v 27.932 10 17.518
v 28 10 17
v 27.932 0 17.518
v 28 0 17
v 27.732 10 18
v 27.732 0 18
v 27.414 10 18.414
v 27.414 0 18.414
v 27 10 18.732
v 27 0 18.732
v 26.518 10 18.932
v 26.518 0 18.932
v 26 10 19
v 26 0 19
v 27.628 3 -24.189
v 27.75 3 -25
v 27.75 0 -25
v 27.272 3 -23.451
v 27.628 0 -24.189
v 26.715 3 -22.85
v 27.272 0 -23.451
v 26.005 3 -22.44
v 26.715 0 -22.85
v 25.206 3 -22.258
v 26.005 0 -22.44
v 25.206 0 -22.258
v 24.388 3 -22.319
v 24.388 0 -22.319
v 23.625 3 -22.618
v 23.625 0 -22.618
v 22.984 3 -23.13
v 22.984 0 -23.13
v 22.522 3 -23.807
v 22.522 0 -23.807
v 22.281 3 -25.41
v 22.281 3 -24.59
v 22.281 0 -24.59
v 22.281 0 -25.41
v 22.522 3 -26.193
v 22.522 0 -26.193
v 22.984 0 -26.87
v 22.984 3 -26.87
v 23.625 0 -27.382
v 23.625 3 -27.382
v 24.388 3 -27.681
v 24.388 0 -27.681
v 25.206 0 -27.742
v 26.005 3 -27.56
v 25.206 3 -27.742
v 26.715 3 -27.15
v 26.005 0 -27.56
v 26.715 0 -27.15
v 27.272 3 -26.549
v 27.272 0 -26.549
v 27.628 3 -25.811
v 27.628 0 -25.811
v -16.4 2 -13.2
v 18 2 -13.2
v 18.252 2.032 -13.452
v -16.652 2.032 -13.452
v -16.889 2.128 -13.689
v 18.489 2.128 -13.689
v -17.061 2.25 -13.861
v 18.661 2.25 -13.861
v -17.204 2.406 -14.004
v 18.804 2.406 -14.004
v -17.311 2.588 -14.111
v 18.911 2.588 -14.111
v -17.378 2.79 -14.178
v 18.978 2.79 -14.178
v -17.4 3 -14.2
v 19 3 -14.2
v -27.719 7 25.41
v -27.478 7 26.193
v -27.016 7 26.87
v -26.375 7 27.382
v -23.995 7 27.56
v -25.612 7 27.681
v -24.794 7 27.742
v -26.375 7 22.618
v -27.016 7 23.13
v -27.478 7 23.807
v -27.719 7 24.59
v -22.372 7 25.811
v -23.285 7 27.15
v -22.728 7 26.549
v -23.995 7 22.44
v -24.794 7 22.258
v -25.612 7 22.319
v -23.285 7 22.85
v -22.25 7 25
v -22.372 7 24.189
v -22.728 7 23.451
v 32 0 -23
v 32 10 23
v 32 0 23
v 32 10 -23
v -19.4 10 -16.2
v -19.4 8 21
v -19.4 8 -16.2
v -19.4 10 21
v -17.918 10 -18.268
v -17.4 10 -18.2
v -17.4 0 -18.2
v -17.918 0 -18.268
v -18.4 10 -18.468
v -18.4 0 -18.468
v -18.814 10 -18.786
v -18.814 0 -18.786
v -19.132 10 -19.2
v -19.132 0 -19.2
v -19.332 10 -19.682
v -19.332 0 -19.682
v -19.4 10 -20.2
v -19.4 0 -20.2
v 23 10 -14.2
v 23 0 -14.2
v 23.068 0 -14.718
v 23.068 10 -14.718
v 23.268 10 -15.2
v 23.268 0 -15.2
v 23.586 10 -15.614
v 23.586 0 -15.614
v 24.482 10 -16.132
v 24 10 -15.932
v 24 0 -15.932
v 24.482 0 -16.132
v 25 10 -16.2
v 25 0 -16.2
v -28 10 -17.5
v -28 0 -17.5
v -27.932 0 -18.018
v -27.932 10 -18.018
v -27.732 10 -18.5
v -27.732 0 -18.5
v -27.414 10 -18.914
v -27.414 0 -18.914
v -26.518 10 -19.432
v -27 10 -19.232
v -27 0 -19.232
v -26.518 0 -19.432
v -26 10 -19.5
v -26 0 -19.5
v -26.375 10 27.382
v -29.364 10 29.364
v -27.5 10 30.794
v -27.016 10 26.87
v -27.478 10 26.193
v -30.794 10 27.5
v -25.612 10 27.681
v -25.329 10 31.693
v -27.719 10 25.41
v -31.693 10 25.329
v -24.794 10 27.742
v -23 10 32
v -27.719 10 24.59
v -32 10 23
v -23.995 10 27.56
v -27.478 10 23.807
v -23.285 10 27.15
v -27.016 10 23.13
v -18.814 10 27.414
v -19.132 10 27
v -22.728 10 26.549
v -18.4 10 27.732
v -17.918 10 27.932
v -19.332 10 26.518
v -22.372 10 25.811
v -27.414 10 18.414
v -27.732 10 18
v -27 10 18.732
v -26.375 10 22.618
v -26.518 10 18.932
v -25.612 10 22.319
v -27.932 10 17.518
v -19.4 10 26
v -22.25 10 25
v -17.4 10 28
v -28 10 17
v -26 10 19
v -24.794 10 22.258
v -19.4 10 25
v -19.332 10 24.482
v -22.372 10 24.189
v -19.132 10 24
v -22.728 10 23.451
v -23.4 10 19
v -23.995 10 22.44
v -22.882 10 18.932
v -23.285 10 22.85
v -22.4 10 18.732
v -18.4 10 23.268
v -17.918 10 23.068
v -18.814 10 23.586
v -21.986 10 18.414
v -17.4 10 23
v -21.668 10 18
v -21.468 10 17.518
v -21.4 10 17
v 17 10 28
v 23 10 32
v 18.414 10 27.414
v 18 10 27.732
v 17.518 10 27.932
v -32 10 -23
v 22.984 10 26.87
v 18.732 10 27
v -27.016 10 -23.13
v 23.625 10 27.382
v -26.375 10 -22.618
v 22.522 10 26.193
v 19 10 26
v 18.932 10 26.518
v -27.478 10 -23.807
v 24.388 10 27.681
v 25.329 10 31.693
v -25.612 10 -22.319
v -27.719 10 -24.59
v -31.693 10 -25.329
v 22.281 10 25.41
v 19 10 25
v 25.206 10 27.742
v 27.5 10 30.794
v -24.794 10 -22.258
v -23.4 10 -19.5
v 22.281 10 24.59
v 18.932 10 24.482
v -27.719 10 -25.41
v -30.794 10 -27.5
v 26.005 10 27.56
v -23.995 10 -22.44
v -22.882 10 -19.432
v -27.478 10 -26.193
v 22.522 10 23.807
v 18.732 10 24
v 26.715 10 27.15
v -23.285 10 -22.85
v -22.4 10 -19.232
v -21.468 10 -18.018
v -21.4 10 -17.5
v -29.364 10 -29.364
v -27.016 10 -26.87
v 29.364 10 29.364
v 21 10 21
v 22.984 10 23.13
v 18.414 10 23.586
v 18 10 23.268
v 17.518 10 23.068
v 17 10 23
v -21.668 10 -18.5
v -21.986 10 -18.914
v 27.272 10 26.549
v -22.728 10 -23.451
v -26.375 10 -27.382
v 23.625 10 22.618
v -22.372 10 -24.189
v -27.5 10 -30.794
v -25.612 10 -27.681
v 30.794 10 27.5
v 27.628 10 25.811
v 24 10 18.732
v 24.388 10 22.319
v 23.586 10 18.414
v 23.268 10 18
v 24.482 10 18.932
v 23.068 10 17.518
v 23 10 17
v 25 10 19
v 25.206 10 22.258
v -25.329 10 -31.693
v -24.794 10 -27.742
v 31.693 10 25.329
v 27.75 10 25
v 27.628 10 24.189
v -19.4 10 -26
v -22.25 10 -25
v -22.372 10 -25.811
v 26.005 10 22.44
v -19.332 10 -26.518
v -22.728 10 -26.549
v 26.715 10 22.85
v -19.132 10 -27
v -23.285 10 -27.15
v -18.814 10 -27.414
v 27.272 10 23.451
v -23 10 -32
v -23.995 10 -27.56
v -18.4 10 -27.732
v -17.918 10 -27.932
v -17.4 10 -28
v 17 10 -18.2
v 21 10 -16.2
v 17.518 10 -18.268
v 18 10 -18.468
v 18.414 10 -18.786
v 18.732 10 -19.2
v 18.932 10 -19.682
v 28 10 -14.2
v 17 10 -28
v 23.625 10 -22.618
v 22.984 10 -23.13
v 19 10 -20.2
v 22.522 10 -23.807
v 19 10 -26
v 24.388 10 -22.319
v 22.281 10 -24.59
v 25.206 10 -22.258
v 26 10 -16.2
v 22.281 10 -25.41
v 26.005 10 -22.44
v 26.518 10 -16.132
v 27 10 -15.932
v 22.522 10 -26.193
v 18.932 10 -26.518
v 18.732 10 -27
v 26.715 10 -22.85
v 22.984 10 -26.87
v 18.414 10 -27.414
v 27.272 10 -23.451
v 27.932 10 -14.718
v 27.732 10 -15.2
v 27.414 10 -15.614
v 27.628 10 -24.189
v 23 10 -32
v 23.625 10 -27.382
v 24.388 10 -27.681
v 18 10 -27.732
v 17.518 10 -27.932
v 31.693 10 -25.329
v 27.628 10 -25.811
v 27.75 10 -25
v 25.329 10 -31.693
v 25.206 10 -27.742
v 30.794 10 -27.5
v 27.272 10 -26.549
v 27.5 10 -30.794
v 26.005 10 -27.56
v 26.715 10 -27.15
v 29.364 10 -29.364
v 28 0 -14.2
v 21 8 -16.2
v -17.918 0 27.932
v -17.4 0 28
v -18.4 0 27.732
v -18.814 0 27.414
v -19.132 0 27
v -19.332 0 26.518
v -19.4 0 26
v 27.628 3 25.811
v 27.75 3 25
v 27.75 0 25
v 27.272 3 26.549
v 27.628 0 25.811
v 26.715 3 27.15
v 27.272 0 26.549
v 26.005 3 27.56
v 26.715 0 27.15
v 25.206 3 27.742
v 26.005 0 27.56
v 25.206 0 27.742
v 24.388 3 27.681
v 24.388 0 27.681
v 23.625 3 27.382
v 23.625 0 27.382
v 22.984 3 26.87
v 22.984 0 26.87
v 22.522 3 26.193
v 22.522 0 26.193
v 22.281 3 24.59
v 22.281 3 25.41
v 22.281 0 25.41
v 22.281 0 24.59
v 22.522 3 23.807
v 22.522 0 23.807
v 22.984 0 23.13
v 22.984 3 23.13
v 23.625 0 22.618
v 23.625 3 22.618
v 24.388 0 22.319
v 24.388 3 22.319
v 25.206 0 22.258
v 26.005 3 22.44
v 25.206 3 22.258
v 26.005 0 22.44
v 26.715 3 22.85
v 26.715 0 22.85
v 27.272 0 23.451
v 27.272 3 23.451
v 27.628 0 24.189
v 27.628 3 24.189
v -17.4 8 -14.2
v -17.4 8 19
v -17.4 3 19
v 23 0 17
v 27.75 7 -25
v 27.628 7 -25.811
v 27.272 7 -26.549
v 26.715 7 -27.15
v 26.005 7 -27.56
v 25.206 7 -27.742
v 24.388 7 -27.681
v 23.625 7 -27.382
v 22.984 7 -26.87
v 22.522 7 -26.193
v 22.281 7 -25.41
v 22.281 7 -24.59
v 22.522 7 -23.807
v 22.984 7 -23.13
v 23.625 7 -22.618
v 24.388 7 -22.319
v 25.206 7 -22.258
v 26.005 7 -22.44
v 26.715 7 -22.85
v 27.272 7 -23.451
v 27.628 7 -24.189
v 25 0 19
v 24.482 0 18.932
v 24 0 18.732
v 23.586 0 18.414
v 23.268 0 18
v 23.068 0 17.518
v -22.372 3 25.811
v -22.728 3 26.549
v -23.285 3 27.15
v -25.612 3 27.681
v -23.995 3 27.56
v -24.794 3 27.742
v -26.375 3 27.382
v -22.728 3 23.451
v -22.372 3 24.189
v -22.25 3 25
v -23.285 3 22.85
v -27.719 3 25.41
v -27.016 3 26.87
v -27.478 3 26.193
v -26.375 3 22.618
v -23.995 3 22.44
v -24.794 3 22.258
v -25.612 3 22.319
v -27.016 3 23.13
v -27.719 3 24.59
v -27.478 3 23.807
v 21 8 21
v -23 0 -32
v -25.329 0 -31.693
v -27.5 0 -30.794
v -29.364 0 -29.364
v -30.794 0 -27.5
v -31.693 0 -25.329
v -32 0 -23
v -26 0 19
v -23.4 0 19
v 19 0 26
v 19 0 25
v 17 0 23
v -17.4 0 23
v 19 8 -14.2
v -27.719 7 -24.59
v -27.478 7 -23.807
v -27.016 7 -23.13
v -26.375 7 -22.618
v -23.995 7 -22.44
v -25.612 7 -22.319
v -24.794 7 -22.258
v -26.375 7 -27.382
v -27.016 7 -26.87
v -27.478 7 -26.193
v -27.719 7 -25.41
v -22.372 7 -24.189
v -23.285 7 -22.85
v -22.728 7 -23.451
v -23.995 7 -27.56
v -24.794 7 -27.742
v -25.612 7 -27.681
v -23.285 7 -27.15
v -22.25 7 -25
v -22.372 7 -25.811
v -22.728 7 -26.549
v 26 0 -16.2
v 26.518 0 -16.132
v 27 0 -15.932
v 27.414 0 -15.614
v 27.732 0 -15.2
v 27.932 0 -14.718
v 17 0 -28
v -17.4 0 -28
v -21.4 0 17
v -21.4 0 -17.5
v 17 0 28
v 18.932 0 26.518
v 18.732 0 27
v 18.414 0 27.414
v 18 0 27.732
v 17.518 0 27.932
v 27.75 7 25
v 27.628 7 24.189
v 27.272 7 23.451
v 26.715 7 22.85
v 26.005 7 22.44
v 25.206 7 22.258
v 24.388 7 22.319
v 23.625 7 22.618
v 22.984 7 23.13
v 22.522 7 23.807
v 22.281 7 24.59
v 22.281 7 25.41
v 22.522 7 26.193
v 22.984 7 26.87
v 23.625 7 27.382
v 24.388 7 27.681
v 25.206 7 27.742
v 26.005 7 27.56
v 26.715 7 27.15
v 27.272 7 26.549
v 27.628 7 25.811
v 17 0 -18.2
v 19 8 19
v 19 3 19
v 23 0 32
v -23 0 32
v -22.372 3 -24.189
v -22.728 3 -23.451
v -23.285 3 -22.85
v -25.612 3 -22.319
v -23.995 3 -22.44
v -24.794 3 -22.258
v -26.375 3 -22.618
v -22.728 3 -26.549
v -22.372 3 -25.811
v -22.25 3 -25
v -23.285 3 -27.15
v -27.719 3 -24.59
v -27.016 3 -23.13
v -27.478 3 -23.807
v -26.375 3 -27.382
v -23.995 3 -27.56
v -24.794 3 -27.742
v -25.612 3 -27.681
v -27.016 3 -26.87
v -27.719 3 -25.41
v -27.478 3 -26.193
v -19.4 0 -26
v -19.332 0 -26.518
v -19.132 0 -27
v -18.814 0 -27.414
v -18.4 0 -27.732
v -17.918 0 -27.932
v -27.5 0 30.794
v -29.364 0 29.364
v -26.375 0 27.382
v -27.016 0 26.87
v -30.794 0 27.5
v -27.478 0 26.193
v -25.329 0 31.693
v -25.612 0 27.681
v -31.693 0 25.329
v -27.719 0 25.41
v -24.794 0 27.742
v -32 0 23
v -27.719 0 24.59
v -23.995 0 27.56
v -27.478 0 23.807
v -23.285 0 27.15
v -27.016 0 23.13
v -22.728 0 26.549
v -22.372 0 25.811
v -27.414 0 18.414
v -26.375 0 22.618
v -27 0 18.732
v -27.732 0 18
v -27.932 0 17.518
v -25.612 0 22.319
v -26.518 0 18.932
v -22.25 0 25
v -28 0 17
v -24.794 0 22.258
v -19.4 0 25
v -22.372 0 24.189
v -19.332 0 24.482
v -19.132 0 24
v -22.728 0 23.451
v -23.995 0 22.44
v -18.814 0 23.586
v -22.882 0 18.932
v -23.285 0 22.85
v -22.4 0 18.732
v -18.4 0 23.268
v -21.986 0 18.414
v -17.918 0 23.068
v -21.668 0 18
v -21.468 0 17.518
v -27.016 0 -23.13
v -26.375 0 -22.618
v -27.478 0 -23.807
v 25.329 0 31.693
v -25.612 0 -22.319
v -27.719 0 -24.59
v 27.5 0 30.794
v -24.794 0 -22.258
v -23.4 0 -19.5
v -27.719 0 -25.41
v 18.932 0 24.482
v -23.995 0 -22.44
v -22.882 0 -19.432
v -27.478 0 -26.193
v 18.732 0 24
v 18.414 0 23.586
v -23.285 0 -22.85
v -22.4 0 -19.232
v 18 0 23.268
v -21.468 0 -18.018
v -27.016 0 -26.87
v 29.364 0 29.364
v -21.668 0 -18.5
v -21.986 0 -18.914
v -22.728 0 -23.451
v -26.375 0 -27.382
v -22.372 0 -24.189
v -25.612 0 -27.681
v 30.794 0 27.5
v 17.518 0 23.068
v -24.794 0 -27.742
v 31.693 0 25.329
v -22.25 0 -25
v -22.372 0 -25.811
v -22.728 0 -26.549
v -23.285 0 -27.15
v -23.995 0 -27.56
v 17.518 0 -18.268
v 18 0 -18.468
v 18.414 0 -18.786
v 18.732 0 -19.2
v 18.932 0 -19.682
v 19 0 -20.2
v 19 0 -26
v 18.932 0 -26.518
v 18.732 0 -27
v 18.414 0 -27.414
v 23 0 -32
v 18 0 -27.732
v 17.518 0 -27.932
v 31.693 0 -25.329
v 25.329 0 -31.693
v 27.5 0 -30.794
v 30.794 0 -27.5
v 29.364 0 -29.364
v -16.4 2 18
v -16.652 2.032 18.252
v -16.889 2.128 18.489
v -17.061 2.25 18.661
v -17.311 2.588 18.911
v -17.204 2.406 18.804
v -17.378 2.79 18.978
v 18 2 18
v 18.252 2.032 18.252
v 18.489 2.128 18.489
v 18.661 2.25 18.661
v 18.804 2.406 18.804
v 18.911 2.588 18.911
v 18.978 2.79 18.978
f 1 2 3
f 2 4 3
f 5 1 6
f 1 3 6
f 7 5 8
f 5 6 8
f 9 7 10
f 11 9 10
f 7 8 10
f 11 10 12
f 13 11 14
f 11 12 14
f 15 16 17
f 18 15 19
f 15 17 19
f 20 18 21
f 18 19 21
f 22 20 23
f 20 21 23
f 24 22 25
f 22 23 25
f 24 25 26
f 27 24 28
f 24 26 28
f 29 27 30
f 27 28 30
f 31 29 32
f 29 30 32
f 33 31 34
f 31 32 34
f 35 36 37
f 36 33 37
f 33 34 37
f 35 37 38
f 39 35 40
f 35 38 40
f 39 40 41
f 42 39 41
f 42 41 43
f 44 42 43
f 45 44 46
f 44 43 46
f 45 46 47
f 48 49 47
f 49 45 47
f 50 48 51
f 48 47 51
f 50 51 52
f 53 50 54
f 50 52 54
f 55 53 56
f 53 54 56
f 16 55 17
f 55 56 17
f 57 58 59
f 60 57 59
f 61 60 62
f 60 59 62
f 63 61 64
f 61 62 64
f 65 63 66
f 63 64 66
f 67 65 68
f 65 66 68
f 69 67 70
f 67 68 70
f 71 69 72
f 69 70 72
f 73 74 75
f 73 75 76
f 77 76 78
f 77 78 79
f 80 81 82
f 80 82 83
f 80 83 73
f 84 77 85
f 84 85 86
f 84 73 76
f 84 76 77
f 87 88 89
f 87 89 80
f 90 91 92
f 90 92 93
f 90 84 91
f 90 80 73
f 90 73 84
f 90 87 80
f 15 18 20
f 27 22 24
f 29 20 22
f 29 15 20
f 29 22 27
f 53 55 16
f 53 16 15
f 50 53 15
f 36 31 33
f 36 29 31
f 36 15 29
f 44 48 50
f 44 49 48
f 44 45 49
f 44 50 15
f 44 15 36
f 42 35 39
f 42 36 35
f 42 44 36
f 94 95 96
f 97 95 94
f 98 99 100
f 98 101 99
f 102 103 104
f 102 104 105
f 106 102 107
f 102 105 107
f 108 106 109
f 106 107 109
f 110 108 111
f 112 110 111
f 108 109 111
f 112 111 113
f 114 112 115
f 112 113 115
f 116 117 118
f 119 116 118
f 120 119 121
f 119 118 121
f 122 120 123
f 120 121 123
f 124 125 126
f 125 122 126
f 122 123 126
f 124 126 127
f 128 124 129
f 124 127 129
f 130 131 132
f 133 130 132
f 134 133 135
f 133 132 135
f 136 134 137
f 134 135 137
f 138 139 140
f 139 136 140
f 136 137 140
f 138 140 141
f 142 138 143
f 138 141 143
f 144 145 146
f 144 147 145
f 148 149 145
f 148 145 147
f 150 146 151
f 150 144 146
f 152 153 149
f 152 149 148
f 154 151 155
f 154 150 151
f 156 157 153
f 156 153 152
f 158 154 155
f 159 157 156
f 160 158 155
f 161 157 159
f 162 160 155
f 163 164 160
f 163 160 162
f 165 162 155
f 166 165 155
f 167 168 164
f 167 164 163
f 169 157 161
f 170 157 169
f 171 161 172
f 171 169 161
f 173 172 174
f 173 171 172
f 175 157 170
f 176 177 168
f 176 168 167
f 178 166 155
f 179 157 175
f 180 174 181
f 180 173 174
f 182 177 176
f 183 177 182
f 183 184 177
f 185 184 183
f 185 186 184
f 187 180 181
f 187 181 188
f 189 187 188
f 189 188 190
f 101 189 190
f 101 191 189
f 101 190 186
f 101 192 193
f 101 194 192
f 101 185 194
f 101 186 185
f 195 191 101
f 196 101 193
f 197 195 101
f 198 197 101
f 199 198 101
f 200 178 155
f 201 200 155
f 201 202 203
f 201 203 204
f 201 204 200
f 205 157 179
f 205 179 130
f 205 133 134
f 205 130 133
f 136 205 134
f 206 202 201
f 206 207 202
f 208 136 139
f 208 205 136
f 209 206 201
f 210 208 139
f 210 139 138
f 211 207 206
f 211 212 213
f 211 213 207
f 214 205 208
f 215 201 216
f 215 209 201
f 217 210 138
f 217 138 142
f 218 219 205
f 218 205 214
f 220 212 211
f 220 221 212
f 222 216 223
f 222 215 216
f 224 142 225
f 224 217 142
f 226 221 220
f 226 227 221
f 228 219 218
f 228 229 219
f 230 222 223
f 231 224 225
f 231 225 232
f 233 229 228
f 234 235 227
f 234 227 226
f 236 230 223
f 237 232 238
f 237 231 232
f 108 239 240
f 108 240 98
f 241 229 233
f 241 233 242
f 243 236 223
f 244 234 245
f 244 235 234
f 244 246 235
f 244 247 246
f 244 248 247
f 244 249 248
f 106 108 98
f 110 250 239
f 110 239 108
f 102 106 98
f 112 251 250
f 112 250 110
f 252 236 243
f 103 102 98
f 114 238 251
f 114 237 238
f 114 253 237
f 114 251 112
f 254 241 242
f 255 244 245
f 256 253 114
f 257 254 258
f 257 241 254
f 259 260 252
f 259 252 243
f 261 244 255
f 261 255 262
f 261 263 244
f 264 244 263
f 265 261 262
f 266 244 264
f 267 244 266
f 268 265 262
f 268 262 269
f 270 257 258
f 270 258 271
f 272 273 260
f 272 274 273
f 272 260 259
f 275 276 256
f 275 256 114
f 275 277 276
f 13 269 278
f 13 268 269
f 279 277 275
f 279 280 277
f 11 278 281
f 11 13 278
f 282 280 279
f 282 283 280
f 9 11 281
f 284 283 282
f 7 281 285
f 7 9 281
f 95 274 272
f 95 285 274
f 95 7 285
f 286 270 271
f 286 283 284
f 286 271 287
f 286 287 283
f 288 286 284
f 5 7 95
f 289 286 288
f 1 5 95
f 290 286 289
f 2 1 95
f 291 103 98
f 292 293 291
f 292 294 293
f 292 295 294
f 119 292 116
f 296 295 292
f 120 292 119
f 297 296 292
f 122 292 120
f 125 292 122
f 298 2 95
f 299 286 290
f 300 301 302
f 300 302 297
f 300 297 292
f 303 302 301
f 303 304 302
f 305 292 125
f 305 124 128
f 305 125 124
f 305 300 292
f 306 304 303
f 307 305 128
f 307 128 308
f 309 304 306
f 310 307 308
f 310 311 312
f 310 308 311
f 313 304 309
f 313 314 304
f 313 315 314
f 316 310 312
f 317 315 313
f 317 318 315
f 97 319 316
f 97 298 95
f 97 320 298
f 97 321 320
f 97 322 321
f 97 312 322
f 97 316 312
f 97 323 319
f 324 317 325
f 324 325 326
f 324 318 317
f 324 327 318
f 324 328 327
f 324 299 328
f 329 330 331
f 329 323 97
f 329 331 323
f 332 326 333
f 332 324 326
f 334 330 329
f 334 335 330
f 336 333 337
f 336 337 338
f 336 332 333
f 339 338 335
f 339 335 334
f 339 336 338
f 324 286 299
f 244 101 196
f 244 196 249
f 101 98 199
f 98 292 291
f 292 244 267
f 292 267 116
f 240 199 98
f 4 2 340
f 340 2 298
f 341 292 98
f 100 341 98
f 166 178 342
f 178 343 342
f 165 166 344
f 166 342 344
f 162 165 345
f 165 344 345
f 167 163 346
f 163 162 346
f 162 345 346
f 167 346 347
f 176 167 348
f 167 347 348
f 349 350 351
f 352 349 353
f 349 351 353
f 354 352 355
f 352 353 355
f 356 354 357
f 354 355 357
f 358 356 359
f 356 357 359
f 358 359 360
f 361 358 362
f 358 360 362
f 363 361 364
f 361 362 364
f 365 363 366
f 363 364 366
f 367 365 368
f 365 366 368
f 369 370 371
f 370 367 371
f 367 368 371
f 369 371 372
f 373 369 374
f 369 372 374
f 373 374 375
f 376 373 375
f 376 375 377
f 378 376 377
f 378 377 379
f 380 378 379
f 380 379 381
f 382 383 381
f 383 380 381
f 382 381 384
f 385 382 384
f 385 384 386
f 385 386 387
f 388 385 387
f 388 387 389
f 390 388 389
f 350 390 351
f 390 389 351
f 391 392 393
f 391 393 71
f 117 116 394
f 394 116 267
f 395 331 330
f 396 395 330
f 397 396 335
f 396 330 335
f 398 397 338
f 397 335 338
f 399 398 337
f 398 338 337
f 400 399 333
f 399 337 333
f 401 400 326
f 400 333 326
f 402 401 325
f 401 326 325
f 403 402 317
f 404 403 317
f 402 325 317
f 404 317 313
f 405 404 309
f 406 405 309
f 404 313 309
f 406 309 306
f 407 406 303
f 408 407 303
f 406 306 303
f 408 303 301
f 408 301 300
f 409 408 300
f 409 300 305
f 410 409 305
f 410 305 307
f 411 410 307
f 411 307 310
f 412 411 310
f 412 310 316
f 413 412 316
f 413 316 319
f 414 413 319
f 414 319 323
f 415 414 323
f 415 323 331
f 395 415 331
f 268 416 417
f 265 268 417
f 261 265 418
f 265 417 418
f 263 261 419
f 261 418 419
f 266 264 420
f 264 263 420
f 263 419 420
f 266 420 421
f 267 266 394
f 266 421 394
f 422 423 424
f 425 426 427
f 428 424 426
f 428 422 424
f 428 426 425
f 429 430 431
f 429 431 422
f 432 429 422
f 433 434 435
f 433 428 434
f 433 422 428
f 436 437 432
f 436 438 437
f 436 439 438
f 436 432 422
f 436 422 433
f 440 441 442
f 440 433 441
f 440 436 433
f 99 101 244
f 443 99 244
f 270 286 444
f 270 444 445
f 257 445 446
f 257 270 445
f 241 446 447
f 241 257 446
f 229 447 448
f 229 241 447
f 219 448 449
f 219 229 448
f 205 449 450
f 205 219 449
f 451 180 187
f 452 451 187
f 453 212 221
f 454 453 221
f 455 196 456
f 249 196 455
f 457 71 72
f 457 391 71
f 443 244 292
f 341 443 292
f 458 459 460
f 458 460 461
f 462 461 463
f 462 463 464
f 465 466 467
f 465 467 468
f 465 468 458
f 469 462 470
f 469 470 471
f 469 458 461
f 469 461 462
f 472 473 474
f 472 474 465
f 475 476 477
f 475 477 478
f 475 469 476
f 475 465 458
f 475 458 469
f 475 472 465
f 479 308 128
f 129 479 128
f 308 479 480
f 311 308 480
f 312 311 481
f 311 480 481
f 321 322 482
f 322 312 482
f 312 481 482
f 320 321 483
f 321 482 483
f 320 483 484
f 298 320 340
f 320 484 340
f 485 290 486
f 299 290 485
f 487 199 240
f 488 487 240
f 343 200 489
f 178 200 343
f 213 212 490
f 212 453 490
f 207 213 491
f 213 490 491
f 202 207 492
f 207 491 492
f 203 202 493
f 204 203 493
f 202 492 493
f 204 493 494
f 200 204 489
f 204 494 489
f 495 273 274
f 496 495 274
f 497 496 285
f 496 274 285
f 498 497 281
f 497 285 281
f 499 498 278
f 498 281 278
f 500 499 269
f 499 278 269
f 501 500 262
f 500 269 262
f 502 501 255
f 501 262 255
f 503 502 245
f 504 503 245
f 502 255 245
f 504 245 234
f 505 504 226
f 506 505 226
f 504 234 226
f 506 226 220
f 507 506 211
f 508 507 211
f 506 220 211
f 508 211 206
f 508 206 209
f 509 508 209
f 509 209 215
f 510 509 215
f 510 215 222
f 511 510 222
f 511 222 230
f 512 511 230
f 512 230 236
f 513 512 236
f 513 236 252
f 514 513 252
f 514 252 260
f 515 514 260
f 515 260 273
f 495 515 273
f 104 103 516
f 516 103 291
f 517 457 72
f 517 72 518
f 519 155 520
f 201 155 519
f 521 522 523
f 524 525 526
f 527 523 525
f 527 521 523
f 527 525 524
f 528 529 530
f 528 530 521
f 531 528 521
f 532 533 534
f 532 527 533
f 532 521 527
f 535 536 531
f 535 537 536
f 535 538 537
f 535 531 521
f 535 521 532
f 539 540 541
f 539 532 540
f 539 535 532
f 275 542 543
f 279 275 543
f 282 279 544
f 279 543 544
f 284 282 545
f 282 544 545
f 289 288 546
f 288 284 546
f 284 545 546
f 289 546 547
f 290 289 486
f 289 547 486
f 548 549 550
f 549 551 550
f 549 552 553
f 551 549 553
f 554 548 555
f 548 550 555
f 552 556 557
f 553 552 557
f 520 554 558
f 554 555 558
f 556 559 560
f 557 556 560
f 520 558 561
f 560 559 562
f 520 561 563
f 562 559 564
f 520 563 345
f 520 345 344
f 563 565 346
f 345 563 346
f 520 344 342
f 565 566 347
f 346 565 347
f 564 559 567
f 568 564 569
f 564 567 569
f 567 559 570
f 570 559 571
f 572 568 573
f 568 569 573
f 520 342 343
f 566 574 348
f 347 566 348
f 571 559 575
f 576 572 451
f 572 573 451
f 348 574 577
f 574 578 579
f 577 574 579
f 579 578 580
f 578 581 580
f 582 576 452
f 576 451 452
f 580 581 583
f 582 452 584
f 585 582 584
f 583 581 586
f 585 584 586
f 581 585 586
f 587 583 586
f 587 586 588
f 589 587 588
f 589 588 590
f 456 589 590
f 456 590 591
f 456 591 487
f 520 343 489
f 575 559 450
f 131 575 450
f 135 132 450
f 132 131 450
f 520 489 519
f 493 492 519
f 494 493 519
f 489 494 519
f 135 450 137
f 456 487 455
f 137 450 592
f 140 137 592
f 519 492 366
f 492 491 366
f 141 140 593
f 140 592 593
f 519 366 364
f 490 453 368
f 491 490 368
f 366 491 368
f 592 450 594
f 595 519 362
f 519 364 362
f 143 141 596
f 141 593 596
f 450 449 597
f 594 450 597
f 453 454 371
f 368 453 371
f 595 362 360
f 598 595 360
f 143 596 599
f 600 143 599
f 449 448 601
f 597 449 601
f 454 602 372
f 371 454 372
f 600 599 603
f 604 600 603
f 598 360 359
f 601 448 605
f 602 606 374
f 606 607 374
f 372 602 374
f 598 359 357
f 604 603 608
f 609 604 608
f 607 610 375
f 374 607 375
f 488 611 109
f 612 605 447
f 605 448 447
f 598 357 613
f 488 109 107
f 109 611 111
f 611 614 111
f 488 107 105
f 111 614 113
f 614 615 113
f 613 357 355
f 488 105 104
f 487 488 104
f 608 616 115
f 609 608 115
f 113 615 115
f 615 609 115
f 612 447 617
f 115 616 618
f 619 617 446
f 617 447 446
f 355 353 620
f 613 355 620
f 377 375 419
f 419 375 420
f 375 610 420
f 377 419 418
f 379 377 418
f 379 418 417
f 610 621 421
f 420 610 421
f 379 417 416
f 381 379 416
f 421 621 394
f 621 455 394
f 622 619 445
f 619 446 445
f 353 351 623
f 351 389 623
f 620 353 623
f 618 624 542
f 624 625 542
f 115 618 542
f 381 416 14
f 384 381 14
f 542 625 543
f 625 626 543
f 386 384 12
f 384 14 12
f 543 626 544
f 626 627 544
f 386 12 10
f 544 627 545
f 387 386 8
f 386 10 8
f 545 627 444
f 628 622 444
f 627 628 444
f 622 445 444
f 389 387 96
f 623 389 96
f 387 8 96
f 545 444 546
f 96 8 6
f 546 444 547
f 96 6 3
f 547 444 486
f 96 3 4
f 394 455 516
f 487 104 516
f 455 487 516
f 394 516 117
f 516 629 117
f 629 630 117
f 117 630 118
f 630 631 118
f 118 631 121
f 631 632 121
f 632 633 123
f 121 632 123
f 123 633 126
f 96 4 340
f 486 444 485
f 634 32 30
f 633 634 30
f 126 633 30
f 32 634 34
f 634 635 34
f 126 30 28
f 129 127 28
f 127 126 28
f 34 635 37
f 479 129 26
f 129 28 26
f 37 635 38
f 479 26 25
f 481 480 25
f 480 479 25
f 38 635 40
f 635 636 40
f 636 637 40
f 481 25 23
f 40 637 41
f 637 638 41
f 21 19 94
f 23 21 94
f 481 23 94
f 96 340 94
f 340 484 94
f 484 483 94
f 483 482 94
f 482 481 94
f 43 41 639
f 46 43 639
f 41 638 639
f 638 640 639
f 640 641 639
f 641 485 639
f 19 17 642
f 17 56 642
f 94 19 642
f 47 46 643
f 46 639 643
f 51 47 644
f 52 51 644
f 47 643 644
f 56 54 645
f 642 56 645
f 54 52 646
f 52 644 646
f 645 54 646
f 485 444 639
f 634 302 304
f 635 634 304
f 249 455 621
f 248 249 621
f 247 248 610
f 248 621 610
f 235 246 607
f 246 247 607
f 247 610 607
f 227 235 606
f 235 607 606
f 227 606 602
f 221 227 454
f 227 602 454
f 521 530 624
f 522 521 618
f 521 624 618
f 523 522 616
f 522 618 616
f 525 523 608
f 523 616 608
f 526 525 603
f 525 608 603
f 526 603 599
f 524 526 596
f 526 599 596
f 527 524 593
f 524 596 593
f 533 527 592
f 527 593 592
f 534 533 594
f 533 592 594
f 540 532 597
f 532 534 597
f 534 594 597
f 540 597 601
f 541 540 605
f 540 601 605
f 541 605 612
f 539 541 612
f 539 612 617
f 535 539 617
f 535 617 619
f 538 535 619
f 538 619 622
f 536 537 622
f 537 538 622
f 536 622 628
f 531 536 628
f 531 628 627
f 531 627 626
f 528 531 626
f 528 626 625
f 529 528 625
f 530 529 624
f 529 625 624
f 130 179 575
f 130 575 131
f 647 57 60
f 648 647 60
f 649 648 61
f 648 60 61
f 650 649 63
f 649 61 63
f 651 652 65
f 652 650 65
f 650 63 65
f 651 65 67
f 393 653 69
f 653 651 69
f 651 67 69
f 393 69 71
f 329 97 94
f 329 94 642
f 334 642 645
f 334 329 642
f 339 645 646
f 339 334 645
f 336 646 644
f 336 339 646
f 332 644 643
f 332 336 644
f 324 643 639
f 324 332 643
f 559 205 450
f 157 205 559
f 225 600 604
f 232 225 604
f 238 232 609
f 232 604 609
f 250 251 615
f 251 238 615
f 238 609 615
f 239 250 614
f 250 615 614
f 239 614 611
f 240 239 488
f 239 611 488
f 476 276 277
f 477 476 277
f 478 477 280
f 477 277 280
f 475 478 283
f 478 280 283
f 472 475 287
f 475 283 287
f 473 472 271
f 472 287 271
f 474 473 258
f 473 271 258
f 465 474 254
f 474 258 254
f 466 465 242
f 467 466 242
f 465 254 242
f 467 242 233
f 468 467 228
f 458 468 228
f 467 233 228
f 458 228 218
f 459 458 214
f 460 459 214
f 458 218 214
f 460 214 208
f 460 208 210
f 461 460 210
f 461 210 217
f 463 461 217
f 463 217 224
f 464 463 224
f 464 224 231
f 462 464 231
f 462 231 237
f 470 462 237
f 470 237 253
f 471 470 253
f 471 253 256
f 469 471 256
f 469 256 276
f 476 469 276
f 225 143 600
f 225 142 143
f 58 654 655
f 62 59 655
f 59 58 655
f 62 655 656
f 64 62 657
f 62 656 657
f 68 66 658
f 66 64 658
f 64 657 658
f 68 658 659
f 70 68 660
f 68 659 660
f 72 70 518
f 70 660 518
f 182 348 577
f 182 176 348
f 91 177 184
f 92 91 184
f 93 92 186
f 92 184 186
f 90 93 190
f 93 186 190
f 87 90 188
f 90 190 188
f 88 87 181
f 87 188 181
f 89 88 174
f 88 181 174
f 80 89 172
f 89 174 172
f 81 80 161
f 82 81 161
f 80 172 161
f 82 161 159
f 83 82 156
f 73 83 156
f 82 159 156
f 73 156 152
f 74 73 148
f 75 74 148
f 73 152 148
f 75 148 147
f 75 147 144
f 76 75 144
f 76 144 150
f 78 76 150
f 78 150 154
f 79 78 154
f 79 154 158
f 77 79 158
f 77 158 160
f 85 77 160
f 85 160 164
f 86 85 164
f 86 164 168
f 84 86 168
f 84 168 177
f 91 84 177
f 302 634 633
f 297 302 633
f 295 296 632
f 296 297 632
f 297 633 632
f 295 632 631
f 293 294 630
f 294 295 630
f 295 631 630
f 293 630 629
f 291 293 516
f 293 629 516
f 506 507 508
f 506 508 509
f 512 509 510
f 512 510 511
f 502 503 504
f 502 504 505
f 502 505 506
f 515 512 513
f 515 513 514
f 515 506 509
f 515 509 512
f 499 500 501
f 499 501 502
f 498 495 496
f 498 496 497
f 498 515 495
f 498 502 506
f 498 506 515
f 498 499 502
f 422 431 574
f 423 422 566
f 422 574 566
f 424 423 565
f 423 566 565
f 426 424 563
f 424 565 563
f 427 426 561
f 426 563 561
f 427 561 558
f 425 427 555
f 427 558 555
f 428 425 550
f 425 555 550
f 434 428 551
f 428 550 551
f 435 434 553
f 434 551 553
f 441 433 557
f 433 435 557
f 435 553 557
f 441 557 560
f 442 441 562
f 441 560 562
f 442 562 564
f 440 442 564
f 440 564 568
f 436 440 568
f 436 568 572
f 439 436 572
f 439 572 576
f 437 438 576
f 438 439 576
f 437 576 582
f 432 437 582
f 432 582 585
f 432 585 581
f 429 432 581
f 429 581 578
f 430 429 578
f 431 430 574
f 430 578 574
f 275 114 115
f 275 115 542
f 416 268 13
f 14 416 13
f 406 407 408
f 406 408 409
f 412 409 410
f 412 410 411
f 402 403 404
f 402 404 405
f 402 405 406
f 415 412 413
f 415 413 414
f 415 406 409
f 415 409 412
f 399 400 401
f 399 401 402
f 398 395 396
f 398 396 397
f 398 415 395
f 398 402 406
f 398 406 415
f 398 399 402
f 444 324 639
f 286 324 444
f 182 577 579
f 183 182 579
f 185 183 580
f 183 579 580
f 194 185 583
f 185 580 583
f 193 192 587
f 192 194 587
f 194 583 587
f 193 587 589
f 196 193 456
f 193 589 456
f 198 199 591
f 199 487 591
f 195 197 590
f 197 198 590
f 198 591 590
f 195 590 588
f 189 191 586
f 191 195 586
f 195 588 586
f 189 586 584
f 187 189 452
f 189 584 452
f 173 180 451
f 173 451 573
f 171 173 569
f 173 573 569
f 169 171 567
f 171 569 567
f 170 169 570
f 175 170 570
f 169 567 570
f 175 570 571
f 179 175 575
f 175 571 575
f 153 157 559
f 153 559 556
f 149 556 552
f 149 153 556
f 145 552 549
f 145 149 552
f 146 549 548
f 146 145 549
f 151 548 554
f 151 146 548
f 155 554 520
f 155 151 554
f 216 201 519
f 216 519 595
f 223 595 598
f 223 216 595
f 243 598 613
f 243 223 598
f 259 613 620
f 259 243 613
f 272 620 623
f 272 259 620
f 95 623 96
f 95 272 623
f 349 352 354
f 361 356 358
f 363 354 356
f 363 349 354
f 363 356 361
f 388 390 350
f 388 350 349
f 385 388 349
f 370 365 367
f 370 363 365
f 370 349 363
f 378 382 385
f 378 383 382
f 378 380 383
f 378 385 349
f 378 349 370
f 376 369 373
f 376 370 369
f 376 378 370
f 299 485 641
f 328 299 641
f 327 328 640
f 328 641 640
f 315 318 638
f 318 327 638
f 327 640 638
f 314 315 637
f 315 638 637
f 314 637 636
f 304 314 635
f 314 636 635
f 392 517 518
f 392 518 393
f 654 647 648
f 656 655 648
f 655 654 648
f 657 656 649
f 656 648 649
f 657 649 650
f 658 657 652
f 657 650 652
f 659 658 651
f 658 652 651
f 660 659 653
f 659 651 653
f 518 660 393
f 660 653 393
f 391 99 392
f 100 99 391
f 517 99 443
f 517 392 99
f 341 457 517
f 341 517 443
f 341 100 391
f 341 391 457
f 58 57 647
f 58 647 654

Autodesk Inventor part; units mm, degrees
ref_plane "YZ Plane" through (0, 0, 0) normal (1, 0, 0) x (0, 1, 0)
ref_plane "XZ Plane" through (0, 0, 0) normal (0, 1, 0) x (-1, 0, 0)
sketch "Sketch1" plane through (0, 0, 0) normal (0, 1, 0) x (-1, 0, 0)
  line L0 (30, 30) -> (-30, 30)
  line L1 (-30, 30) -> (-30, -30)
  line L2 (-30, -30) -> (30, -30)
  line L3 (30, -30) -> (30, 30)
  line L4 (30, 30) -> (-30, -30) construction
  line L5 (-30, 30) -> (30, -30) construction
  point P0 (0, 0)
  dimension "d0" = 60
  dimension "d1" = 60
extrude "Extrusion1" add sketch "Sketch1" along normal blind 10
fillet "Fillet1" radius 7 4 edges at (30, 5, 30) (30, 5, -30) (-30, 5, 30) (-30, 5, -30)
sketch "Sketch2" plane through (0, 10, 0) normal (0, 1, 0) x (1, 0, 0)
  line L0 (-30, 30) -> (30, 30)
  line L1 (30, 30) -> (30, -30)
  line L2 (30, -30) -> (-30, -30)
  line L3 (-30, -30) -> (-30, 30)
  line L4 (-30, 30) -> (30, -30) construction
  line L5 (30, 30) -> (-30, -30) construction
  line L6 (25, -25) -> (25, 25)
  line L7 (25, 25) -> (-25, 25)
  line L8 (-25, 25) -> (-25, -25)
  line L9 (-25, -25) -> (25, -25)
  circle A0 centre (25, -25) radius 2.75
  circle A1 centre (-25, -25) radius 2.75
  circle A2 centre (25, 25) radius 2.75
  circle A3 centre (-25, 25) radius 2.75
  point P0 (0, 0)
  dimension "d5" = 5
  dimension "d6" = 5.5
  dimension "d7" = 5.5
  dimension "d8" = 5.5
  dimension "d9" = 5.5
extrude "Extrusion2" cut sketch "Sketch2" against normal blind 3 contours L9 A0 L6 | L6 A0 L9 | A2 L7 L6 | L6 L7 A2 | A1 L8 L9 | L9 L8 A1 | A3 L8 L7 | L7 L8 A3
sketch "Sketch7" plane through (0, 10, 0) normal (0, 1, 0) x (1, 0, 0)
  line L0 (-23, 30) -> (23, 30)
  line L1 (30, 23) -> (30, -23)
  line L2 (23, -30) -> (-23, -30)
  line L3 (-30, -23) -> (-30, 23)
  line L4 (-30, 30) -> (30, -30) construction
  line L5 (30, 30) -> (-30, -30) construction
  arc A0 (-23, 30) -> (-30, 23) centre (-23, 23) ccw
  arc A1 (-30, -23) -> (-23, -30) centre (-23, -23) ccw
  arc A2 (23, -30) -> (30, -23) centre (23, -23) ccw
  arc A3 (30, 23) -> (23, 30) centre (23, 23) ccw
  line L6 (23, 32) -> (-23, 32)
  arc A4 (-23, 32) -> (-32, 23) centre (-23, 23) ccw
  line L7 (-32, 23) -> (-32, -23)
  arc A5 (-32, -23) -> (-23, -32) centre (-23, -23) ccw
  line L8 (-23, -32) -> (23, -32)
  arc A6 (23, -32) -> (32, -23) centre (23, -23) ccw
  line L9 (32, -23) -> (32, 23)
  arc A7 (32, 23) -> (23, 32) centre (23, 23) ccw
  point P0 (0, 0)
  dimension "d47" = 7
  dimension "d48" = 2
extrude "Extrusion6" add sketch "Sketch7" against normal blind 10
sketch "Sketch11" plane through (0, 10, 0) normal (0, 1, 0) x (1, 0, 0)
  circle A0 centre (25, -25) radius 2.75 projected
  line L0 (-25, 25) -> (25, 25)
  line L1 (25, 25) -> (25, -25)
  line L2 (25, -25) -> (-25, -25)
  line L3 (-25, -25) -> (-25, 25)
  line L4 (-25, 25) -> (25, -25) construction
  line L5 (25, 25) -> (-25, -25) construction
  line L6 (21, -21) -> (21, 16.2)
  line L7 (-19.4, -21) -> (21, -21)
  line L8 (-19.4, -21) -> (-19.4, 16.2)
  line L9 (21, 16.2) -> (-19.4, 16.2)
  line L10 (-17.4, 14.2) -> (-17.4, -19)
  line L11 (-17.4, -19) -> (19, -19)
  line L12 (19, -19) -> (19, 14.2)
  line L13 (19, 14.2) -> (-17.4, 14.2)
  point P0 (0, 0)
  dimension "d66" = 4
  dimension "d67" = 40.4
  dimension "d68" = 37.2
  dimension "d69" = 2
extrude "Extrusion9" cut sketch "Sketch11" against normal blind 2 contours L7 L8 L9 L6
sketch "Sketch12" plane through (0, 10, 0) normal (0, 1, 0) x (1, 0, 0)
  line L0 (-17.4, 14.2) -> (19, 14.2)
  line L1 (19, 14.2) -> (19, -19)
  line L2 (19, -19) -> (-17.4, -19)
  line L3 (-17.4, -19) -> (-17.4, 14.2)
  point P0 (0, 0)
extrude "Extrusion10" cut sketch "Sketch12" against normal blind 8
sketch "Sketch13" plane through (0, 10, 0) normal (0, 1, 0) x (1, 0, 0)
  line L0 (23, 32) -> (-23, 32) projected
  line L1 (-19.4, 18.2) -> (-19.4, 28)
  line L2 (-19.4, 28) -> (19, 28)
  line L3 (-19.4, 18.2) -> (19, 18.2)
  line L4 (32, -23) -> (32, 23) projected
  line L5 (21, 16.2) -> (21, -21) projected
  line L6 (28, 16.2) -> (23, 16.2)
  line L7 (23, 16.2) -> (23, -19)
  line L8 (28, -19) -> (28, 16.2)
  line L9 (23, -19) -> (28, -19)
  line L10 (21, -21) -> (-19.4, -21) projected
  line L11 (-23, -32) -> (23, -32) projected
  line L12 (19, -28) -> (19, -23)
  line L13 (19, -28) -> (-19.4, -28)
  line L14 (-19.4, -28) -> (-19.4, -23)
  line L15 (-19.4, -23) -> (19, -23)
  line L16 (19, 18.2) -> (19, 28)
  line L17 (19, 14.2) -> (19, -19) projected
  line L18 (-32, 23) -> (-32, -23) projected
  line L19 (-19.4, -21) -> (-19.4, 16.2) projected
  line L20 (-28, -19) -> (-28, 19.5)
  line L21 (-28, -19) -> (-21.4, -19)
  line L22 (-21.4, -19) -> (-21.4, 19.5)
  line L23 (-28, 19.5) -> (-21.4, 19.5)
  dimension "d77" = 2
  dimension "d78" = 4
  dimension "d81" = 2
  dimension "d84" = 2
  dimension "d87" = 4
  dimension "d88" = 4
  dimension "d89" = 2
  dimension "d90" = 38.5
extrude "Extrusion11" cut sketch "Sketch13" against normal through all
fillet "Fillet3" radius 2 16 edges at (-19.4, 5, -28) (-28, 5, -19.5) (23, 5, -16.2) (-19.4, 5, 23) (19, 5, -28) (-21.4, 5, -19.5) (28, 5, -16.2) (19, 5, 23) (19, 5, -18.2) (28, 5, 19) (19, 5, 28) (-21.4, 5, 19) (-19.4, 5, -18.2) (23, 5, 19) (-19.4, 5, 28) (-28, 5, 19)
fillet "Fillet3" radius 1 4 edges at (0.8, 2, -14.2) (19, 2, 2.4) (-17.4, 2, 2.4) (0.8, 2, 19)
ref_plane "Work Plane2" through (0, 5, 0) normal (0, 1, 0) x (1, 0, 0)
mirror "Mirror2" about plane through (0, 5, 0) normal (0, 1, 0) of "Extrusion2"
properties part number "20 pin IC holder2"
